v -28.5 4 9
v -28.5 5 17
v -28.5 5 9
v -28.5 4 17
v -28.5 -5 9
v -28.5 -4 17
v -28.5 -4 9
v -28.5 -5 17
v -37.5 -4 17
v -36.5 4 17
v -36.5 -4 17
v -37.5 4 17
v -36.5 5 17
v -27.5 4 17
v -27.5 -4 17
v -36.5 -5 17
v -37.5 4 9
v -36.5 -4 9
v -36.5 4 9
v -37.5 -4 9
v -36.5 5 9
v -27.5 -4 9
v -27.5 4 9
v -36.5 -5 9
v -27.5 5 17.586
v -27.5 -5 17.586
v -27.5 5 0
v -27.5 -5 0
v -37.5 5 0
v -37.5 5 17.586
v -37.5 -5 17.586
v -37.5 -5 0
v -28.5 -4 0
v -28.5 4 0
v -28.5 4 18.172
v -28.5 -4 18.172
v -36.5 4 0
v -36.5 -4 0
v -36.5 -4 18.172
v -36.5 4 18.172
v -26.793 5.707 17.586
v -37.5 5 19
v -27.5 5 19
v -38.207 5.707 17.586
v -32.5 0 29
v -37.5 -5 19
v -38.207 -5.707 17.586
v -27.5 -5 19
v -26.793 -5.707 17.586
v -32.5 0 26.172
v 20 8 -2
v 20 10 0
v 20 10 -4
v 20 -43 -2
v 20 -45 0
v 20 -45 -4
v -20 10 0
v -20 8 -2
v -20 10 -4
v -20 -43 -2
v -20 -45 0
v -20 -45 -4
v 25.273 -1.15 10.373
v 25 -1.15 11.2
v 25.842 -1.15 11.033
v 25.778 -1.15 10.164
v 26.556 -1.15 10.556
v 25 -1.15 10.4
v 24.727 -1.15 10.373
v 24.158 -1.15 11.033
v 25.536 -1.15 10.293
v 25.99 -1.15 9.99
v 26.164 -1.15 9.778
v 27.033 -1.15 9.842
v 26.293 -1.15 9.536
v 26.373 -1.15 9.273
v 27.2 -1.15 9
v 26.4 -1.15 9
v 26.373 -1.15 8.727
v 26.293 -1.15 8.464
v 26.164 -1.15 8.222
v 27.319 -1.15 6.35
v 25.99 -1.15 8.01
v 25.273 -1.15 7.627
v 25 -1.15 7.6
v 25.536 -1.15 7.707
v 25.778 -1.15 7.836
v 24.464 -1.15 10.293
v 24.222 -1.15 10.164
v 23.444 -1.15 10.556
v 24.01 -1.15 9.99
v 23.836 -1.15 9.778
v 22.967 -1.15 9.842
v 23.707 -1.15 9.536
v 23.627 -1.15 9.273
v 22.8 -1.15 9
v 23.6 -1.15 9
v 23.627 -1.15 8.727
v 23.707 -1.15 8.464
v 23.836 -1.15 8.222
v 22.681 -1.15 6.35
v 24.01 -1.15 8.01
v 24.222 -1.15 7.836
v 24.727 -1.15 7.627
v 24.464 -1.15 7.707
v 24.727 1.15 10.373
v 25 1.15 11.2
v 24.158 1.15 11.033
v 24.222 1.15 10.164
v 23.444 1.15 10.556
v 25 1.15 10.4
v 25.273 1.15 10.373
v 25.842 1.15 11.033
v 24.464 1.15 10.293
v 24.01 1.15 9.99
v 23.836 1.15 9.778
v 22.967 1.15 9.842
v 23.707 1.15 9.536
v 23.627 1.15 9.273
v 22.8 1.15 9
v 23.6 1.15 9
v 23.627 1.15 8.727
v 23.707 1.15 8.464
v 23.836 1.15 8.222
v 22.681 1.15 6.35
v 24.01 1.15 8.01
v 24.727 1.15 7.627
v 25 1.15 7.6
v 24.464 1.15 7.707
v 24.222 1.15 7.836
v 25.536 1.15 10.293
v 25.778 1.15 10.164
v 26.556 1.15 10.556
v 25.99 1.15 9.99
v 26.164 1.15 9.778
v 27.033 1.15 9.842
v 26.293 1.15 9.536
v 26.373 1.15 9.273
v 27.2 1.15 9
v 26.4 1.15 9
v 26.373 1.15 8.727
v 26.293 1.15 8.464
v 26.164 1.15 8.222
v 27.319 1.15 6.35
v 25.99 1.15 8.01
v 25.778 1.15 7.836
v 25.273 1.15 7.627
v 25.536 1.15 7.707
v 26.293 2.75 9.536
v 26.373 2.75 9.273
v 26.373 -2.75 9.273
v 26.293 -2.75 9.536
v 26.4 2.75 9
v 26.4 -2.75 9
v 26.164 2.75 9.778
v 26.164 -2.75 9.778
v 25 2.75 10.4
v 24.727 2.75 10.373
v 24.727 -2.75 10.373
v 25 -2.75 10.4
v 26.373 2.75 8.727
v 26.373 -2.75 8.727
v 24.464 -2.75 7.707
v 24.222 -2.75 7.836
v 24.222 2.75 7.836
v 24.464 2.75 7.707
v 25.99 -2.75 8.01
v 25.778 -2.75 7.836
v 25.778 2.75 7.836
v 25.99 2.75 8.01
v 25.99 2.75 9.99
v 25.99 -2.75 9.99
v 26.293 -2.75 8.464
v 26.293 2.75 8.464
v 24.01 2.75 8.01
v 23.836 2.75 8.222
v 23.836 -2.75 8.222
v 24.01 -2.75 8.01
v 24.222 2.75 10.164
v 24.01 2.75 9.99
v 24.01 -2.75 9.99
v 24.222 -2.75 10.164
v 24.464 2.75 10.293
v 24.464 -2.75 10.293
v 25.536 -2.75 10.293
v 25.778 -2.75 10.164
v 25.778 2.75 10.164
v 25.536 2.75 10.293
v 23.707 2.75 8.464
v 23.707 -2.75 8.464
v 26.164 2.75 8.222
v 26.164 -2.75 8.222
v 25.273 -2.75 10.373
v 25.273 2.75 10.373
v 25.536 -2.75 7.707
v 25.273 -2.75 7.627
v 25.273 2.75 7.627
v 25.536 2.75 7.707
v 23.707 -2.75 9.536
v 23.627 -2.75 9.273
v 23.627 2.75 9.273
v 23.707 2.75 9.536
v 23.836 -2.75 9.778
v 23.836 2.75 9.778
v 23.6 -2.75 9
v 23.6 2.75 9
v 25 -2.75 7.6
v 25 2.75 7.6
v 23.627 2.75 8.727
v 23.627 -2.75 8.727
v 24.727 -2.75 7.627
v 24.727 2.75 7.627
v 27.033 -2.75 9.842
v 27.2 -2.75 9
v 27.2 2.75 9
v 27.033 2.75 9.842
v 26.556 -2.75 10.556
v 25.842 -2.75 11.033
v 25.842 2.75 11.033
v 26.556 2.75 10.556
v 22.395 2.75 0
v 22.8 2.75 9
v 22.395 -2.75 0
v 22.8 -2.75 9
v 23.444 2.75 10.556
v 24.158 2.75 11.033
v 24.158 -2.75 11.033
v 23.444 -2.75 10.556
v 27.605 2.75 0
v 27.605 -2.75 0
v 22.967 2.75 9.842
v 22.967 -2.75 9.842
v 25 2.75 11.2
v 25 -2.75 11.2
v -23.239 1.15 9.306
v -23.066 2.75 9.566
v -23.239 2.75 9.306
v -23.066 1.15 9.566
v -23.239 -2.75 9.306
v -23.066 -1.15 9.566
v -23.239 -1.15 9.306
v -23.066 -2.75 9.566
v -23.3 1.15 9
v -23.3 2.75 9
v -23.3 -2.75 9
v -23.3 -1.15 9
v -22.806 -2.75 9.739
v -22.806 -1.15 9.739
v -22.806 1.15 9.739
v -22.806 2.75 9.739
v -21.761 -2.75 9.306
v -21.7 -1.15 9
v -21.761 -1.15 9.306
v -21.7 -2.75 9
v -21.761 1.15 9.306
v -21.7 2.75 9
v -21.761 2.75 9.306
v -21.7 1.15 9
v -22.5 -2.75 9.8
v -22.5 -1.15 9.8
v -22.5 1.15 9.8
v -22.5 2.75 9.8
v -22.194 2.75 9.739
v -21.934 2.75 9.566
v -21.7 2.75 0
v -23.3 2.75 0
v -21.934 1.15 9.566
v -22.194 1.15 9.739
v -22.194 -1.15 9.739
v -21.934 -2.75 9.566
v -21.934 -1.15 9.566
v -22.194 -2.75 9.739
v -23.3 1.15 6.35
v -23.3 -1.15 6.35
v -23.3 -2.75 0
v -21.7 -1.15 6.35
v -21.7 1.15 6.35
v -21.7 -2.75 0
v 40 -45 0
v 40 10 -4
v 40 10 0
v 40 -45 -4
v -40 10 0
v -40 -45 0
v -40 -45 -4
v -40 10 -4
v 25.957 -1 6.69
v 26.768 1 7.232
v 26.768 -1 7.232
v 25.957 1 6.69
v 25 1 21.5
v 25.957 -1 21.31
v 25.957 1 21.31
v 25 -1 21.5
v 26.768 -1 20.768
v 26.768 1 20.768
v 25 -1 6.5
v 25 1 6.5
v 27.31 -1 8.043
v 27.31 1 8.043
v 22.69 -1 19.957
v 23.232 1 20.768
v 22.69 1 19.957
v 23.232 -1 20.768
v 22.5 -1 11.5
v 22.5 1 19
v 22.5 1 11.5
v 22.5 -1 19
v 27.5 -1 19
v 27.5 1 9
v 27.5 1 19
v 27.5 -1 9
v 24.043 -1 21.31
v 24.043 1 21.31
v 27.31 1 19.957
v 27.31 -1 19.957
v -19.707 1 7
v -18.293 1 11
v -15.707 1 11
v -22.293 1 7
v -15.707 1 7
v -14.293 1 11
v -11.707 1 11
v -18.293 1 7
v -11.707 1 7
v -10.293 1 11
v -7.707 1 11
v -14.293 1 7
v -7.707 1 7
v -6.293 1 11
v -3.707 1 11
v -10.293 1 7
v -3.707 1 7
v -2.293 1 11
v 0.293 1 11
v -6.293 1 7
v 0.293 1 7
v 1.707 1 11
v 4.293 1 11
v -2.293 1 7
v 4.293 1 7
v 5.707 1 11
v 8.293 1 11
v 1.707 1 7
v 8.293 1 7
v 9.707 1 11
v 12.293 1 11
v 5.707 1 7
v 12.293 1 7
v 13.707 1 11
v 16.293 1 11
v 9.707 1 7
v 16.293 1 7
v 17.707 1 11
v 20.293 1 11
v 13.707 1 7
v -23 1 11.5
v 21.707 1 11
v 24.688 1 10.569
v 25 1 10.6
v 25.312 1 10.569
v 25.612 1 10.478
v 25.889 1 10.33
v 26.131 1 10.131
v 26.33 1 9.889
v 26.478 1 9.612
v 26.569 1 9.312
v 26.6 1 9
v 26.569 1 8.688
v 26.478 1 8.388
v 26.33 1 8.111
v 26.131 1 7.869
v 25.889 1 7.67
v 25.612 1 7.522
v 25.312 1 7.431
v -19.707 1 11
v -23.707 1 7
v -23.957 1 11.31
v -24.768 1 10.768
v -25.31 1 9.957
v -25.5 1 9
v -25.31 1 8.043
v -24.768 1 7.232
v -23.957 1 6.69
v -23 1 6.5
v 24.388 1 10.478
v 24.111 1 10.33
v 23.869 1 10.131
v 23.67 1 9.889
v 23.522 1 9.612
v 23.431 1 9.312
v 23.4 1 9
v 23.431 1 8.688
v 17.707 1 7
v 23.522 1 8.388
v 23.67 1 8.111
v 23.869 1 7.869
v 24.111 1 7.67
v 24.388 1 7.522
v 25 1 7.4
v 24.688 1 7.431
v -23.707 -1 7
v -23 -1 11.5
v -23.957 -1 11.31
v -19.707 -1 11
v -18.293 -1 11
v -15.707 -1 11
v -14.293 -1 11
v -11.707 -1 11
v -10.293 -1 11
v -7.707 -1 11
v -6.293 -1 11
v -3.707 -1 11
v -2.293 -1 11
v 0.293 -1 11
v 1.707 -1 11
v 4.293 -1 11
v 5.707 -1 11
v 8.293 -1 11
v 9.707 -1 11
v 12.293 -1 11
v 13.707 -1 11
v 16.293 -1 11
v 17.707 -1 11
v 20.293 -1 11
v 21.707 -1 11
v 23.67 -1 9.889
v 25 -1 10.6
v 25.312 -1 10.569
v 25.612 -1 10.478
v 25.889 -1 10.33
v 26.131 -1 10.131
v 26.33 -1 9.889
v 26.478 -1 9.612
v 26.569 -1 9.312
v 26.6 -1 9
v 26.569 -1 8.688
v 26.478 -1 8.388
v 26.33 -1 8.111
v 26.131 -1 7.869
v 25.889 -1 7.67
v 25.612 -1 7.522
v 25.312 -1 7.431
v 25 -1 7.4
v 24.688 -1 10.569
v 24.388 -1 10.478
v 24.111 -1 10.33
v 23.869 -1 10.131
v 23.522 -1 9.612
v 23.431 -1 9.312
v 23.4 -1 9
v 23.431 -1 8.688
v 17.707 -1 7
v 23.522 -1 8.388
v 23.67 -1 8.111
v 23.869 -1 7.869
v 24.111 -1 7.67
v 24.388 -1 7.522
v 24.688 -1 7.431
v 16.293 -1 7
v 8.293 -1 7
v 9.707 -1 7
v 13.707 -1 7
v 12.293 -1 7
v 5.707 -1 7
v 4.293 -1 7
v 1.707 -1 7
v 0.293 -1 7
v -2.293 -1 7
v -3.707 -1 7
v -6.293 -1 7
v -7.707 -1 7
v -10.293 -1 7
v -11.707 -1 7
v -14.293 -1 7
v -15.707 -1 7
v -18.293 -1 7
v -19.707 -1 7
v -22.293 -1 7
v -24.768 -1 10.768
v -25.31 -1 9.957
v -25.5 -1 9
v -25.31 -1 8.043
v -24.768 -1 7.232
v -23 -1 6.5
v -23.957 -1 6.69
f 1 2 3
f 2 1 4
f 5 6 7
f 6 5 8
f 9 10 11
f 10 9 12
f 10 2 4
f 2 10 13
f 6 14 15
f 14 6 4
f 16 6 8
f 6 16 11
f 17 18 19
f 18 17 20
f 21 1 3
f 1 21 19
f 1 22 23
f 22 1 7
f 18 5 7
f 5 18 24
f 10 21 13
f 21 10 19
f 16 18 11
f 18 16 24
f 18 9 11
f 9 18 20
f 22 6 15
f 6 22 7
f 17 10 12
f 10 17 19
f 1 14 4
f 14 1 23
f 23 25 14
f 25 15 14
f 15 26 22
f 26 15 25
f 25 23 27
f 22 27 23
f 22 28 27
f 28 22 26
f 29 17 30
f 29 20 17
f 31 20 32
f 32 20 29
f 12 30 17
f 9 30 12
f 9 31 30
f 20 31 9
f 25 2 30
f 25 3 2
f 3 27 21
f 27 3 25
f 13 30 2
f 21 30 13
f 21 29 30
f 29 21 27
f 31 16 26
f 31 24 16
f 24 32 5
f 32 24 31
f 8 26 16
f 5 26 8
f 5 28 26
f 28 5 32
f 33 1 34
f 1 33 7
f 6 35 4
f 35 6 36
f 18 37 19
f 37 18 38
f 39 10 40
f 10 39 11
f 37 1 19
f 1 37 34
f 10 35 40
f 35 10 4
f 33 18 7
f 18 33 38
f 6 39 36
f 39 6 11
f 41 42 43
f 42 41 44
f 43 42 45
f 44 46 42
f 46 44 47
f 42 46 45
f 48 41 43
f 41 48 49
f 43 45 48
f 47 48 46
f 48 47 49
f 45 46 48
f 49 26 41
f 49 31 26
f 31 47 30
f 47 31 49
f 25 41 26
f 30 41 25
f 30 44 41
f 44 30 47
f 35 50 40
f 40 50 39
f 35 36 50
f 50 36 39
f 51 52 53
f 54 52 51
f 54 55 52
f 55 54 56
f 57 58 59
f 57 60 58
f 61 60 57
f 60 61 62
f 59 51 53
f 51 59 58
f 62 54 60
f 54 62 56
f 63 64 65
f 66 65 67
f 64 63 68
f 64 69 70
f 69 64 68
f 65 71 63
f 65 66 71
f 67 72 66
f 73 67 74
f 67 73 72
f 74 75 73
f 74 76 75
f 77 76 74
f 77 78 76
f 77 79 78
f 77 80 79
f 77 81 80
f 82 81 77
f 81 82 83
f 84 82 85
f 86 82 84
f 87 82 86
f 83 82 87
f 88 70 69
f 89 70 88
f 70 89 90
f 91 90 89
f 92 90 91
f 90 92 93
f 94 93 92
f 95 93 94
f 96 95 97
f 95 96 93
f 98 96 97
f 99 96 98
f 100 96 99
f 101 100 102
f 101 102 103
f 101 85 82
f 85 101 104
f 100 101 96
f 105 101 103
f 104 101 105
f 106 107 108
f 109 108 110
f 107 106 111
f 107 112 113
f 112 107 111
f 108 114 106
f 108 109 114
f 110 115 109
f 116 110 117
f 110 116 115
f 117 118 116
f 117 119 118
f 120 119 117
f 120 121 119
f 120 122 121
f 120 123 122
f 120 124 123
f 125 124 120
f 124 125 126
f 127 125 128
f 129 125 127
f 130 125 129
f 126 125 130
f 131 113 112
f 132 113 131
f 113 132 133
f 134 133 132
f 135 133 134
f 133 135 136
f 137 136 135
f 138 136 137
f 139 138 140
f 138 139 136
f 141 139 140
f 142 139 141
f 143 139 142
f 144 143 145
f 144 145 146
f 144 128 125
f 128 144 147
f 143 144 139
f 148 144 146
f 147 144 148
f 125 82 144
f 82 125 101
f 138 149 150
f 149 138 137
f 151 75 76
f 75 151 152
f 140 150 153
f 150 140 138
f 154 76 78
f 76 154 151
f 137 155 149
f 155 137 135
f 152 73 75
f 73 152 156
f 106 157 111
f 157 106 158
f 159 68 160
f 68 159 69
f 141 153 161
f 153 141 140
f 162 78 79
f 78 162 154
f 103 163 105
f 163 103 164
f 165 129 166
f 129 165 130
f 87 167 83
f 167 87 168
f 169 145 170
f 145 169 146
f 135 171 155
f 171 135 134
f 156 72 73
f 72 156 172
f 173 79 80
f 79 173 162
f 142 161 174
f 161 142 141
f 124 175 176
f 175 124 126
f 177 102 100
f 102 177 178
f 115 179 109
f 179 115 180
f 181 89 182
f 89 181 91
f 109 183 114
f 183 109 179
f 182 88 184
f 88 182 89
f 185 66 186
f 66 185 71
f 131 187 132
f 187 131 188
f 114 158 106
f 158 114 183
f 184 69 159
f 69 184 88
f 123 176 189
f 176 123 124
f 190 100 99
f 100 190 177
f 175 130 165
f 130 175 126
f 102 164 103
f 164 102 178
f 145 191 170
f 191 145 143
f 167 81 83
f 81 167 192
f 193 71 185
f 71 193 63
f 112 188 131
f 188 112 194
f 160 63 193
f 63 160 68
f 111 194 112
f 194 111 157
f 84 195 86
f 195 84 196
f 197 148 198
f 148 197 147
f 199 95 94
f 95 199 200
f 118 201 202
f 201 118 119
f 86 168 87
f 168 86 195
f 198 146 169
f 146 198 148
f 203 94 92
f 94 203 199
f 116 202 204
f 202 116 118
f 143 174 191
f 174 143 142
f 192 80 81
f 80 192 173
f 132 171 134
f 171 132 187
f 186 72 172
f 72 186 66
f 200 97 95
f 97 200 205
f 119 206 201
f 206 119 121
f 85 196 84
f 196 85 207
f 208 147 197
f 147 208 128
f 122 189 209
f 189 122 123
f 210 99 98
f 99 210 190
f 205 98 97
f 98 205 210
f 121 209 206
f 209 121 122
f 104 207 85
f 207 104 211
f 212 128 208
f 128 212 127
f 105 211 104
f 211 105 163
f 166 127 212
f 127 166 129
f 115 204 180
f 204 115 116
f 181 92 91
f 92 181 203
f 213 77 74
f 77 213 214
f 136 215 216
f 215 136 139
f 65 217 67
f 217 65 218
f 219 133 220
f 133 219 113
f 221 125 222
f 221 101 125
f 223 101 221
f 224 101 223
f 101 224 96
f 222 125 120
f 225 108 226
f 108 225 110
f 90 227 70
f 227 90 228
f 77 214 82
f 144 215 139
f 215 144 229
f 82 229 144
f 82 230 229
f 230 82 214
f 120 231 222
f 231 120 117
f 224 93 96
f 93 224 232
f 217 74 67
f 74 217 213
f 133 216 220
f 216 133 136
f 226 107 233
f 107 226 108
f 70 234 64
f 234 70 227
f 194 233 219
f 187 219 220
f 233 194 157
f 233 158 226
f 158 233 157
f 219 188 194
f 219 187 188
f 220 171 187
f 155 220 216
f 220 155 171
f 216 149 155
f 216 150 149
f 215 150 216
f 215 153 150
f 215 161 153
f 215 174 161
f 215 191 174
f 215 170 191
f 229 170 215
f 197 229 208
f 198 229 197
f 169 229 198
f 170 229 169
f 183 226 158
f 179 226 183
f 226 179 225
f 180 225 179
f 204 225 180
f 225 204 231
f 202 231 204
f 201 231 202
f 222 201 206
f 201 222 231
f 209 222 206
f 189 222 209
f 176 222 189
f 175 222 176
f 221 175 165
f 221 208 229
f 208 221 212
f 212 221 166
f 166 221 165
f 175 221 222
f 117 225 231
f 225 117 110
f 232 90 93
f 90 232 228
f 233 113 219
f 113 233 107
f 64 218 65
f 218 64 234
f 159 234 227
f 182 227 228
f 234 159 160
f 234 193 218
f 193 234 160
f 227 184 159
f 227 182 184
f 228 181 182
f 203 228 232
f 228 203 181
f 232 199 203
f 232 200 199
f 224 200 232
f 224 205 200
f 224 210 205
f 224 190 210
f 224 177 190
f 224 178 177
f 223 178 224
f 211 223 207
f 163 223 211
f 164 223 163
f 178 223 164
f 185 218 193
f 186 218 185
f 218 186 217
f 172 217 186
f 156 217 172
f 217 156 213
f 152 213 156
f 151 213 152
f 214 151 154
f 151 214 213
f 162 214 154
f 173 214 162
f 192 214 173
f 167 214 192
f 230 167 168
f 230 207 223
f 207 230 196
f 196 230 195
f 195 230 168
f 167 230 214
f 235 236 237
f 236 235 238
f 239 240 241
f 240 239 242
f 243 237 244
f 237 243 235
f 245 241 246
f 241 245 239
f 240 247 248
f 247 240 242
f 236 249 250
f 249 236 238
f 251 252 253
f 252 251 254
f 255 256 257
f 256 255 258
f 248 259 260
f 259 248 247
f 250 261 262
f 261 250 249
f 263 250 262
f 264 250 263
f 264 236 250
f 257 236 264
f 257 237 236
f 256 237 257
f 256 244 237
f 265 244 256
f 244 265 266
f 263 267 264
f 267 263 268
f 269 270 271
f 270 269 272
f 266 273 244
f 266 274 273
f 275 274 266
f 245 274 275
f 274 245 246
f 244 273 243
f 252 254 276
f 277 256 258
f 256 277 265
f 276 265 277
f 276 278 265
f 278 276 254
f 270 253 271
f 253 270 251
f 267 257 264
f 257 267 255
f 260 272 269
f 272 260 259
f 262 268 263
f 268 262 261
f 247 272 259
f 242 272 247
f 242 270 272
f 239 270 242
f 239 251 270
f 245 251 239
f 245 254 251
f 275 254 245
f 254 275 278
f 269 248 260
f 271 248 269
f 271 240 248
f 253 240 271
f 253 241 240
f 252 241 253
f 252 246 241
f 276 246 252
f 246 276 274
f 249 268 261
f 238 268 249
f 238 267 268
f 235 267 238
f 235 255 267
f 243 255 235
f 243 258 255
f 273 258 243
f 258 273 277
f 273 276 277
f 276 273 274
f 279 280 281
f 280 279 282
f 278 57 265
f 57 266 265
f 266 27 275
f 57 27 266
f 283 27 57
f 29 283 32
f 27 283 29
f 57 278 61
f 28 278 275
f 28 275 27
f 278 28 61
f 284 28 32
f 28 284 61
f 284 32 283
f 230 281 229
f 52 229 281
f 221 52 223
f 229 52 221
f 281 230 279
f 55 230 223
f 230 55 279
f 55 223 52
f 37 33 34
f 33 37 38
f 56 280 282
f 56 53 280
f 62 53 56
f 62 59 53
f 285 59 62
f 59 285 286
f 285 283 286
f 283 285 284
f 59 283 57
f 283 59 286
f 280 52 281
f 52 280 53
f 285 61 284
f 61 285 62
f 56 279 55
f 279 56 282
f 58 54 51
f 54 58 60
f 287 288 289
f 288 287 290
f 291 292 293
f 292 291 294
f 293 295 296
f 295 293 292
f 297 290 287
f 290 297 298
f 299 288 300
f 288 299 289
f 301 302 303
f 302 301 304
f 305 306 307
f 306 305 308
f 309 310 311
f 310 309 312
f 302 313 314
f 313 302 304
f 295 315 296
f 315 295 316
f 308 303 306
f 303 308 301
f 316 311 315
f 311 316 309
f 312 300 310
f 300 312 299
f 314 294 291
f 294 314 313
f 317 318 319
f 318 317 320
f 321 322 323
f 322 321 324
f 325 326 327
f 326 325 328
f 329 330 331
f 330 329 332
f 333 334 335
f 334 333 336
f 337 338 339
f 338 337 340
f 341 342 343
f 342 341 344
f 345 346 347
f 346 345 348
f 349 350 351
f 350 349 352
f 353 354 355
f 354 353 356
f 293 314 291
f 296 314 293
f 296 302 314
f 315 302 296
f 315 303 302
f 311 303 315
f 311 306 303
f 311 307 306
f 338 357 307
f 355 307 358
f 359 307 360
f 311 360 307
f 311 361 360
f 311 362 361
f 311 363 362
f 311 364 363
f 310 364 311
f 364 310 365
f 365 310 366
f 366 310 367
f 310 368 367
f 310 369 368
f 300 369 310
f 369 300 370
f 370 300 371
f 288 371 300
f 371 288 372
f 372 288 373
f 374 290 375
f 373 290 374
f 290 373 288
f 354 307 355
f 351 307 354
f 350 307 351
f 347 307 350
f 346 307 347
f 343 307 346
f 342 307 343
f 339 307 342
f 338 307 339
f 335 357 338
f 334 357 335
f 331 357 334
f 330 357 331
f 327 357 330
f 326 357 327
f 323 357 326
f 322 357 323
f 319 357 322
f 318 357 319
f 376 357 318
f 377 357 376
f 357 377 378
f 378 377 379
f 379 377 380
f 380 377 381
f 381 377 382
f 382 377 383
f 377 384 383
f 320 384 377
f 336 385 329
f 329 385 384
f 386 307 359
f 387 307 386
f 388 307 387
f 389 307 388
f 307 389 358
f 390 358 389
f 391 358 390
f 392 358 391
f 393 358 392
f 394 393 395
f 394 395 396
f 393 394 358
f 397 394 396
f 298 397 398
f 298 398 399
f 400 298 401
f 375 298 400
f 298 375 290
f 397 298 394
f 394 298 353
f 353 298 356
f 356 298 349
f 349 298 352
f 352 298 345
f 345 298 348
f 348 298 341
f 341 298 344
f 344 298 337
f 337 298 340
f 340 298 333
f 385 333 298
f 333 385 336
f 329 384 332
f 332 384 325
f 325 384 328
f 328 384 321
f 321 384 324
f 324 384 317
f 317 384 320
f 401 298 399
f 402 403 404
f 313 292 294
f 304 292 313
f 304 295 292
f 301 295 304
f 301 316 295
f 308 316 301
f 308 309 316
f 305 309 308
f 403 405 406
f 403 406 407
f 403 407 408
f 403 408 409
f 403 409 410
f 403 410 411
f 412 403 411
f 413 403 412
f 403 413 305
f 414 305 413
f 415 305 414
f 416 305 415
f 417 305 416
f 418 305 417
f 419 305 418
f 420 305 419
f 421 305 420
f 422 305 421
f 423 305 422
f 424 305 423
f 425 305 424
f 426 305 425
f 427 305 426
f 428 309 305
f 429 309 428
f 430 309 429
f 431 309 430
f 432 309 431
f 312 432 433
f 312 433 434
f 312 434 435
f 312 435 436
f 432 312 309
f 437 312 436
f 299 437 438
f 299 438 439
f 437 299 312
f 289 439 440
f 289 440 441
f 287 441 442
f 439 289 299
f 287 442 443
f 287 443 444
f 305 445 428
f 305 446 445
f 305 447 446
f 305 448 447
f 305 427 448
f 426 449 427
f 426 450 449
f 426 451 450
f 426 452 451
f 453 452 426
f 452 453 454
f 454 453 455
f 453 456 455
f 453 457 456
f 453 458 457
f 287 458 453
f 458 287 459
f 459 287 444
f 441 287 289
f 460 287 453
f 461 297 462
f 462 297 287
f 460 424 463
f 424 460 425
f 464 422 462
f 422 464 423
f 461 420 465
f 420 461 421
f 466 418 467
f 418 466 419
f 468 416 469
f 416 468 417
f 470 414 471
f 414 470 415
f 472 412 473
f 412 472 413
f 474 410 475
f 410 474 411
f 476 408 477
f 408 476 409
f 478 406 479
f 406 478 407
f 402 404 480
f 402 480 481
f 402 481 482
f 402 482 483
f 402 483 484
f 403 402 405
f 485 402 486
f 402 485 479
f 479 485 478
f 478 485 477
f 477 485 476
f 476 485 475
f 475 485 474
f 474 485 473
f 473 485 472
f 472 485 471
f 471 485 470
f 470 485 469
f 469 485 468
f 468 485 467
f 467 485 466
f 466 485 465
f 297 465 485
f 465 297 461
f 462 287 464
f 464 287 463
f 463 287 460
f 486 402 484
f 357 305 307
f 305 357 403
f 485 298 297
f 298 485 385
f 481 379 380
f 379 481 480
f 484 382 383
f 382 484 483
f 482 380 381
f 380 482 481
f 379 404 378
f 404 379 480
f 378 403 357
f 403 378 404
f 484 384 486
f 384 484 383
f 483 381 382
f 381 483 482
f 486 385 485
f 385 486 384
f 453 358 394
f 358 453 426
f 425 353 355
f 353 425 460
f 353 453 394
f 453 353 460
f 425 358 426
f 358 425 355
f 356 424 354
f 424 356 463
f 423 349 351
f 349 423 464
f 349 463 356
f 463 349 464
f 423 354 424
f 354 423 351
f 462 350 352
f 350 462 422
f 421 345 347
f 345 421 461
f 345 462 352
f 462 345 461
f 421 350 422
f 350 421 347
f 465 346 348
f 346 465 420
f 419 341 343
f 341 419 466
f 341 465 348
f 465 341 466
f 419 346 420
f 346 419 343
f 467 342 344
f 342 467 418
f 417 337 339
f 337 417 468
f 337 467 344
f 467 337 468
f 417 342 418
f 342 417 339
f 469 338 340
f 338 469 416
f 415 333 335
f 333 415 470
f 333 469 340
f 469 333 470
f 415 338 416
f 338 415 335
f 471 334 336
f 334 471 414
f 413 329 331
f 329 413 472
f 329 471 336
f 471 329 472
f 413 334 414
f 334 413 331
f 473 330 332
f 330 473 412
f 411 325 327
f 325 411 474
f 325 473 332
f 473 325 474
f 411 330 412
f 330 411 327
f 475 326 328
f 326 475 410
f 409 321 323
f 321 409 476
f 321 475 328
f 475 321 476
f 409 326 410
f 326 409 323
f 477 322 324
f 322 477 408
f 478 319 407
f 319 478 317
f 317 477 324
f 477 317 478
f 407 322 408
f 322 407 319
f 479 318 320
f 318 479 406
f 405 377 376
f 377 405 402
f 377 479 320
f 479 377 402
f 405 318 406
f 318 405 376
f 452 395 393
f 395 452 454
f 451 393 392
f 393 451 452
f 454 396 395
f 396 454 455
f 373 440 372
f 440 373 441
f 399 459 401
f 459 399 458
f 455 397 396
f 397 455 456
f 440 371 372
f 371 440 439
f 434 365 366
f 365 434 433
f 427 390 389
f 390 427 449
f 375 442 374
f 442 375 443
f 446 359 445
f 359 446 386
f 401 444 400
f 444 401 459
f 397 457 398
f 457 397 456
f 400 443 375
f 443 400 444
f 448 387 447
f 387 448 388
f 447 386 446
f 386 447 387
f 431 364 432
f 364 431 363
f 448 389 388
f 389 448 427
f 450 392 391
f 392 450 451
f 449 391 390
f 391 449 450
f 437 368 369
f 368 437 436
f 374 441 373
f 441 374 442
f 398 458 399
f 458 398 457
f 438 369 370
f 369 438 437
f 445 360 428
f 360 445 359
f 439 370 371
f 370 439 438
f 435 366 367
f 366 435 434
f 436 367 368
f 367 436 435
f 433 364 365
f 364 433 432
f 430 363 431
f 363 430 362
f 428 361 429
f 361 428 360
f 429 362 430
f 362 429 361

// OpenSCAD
    HOLE_D_FREE=3.2;
    HOLE_D=2.8;

LANE_W=40;
LANE_SEP=5;
BARRIER_W=2;
BARRIER_H=5;
BARRIER_L=LANE_W+LANE_SEP*2;

module hullChain(pos){
    for(i=[0:len(pos)-2]) {
         hull() {
             translate(pos[i])
                children();
             translate(pos[i+1])
                children();
         }
     }
}

module barrier() {

     difference() {
         hullChain([[0,-10,0],[0,0,0],[BARRIER_L-BARRIER_W,0,0]])
                cylinder($fn=16,d=BARRIER_H,h=BARRIER_W,center=true);
        cylinder($fn=32,d=HOLE_D_FREE,h=100,center=true);
         
         
         
         for(x=[BARRIER_W+2*BARRIER_W:2*BARRIER_W:BARRIER_L-2*BARRIER_W]) {
             translate([x,0,0])
                intersection() {
                    rotate(45,[0,0,1])
                    cube([10,1,11],center=true);
                    S=BARRIER_H-1;
                  cube([S+10,S,11],center=true);
                }
             
             
         }
    }
//    cube([BARRIER_L,BARRIER_W,BARRIER_H]);
}

    BW=10;
    BH=20;
    BOOTH_POS=[-LANE_W/2 -BW/2-LANE_SEP*3/2,0,-1];
module booth() {
    W=1.0;
    translate([0,0,BH/2]) {
        difference() {
            cube([BW,BW,BH],center=true);
            U=BW-2*W;
            cube([U,U,BH*2],center=true);
            
            translate([0,0,U/2]) {
                cube([U,BH,U],center=true);
                rotate(90,[0,0,1])
                cube([U,BH,U],center=true);
            }
        }
        
        translate([0,0,BH/2-W*sqrt(2)])
        difference() {
            B_ROOF=BW*sqrt(2)+2*W;
            B_ROOF_H=B_ROOF/sqrt(2);
            rotate(45,[0,0,1])
                cylinder($fn=4,h=B_ROOF_H,d2=0,d1=B_ROOF);
            translate([0,0,-2*W*sqrt(2)])
            rotate(45,[0,0,1])
                cylinder($fn=4,h=B_ROOF_H,d2=0,d1=B_ROOF);
        }
    }
}

module road() {
    BOTTOM_W=4;
    ROAD_W=2;
    W=80;
    D1=10;
    D2=-45;
    difference() {
        translate([0,0,-BOTTOM_W/2])
        translate([0,(D1+D2)/2,0])
        cube([W,D1-D2,BOTTOM_W],center=true);
        // cut out road
        cube([LANE_W,2*100,2*(BOTTOM_W-ROAD_W)],center=true);
        // cut out ramps for cars
        for(y=[D1,D2])
        translate([0,y,0])
        rotate(45,[1,0,0])
        cube([LANE_W,BOTTOM_W*sqrt(2),BOTTOM_W*sqrt(2)],center=true);
        // cut out booth foundation
        translate(BOOTH_POS)
            booth();
        
        translate(BARRIER_POS)
            rotate(90,[1,0,0])
            barrier_post();
        translate(BARRIER_POS2)
            rotate(90,[1,0,0])
            barrier_post2();

    }
}


//barrier();

    BARRIER_POS=[LANE_W/2+LANE_SEP,0,-1];
    BARRIER_POS2=[-LANE_W/2-LANE_SEP/2,0,-1];
BARRIER_STAND_H=10;

module barrier_post() {
    W=1.6;
    SP=.3;
    W1=BARRIER_W+SP;
    W2=W1+2*W;
    D1=BARRIER_H+SP;
 $fn=16;   
    
    difference() {
        hull() {
            translate([0,BARRIER_STAND_H,0])
            cylinder(d=HOLE_D+W,h=W2,center=true);
            cube([D1,.001,W2],center=true);
//            cylinder(d=D1,h=W2,center=true);
        }
        translate([0,BARRIER_STAND_H,0])    {
            cube([D1,D1,W1],center=true);
            cylinder($fn=32,d=HOLE_D,h=100,center=true);
        }
//        cylinder(d=D1+.00,h=W1,center=true);
        
    }
}

module barrier_post2() {
    W=1.6;
    SP=.3;
    W1=BARRIER_W+SP;
    W2=W1+2*W;
    D1=BARRIER_H+SP;
 $fn=16;   
    
    difference() {
        hull() {
            translate([0,BARRIER_STAND_H,0])
            cylinder(d=W,h=W2,center=true);
            cube([W,.001,W2],center=true);
        }
        translate([0,BARRIER_STAND_H,0])    {
            cube([D1,D1,W1],center=true);
        }
        
    }
}


module preview() {
    translate(BOOTH_POS)
    booth();
    road();
    translate(BARRIER_POS + [0,0,BARRIER_STAND_H])
    rotate(90,[1,0,0])
    rotate(180,[0,0,1])
    barrier();
    
    translate(BARRIER_POS)
    rotate(90,[1,0,0])
    barrier_post();
    translate(BARRIER_POS2)
    rotate(90,[1,0,0])
    barrier_post2();
}

preview();
